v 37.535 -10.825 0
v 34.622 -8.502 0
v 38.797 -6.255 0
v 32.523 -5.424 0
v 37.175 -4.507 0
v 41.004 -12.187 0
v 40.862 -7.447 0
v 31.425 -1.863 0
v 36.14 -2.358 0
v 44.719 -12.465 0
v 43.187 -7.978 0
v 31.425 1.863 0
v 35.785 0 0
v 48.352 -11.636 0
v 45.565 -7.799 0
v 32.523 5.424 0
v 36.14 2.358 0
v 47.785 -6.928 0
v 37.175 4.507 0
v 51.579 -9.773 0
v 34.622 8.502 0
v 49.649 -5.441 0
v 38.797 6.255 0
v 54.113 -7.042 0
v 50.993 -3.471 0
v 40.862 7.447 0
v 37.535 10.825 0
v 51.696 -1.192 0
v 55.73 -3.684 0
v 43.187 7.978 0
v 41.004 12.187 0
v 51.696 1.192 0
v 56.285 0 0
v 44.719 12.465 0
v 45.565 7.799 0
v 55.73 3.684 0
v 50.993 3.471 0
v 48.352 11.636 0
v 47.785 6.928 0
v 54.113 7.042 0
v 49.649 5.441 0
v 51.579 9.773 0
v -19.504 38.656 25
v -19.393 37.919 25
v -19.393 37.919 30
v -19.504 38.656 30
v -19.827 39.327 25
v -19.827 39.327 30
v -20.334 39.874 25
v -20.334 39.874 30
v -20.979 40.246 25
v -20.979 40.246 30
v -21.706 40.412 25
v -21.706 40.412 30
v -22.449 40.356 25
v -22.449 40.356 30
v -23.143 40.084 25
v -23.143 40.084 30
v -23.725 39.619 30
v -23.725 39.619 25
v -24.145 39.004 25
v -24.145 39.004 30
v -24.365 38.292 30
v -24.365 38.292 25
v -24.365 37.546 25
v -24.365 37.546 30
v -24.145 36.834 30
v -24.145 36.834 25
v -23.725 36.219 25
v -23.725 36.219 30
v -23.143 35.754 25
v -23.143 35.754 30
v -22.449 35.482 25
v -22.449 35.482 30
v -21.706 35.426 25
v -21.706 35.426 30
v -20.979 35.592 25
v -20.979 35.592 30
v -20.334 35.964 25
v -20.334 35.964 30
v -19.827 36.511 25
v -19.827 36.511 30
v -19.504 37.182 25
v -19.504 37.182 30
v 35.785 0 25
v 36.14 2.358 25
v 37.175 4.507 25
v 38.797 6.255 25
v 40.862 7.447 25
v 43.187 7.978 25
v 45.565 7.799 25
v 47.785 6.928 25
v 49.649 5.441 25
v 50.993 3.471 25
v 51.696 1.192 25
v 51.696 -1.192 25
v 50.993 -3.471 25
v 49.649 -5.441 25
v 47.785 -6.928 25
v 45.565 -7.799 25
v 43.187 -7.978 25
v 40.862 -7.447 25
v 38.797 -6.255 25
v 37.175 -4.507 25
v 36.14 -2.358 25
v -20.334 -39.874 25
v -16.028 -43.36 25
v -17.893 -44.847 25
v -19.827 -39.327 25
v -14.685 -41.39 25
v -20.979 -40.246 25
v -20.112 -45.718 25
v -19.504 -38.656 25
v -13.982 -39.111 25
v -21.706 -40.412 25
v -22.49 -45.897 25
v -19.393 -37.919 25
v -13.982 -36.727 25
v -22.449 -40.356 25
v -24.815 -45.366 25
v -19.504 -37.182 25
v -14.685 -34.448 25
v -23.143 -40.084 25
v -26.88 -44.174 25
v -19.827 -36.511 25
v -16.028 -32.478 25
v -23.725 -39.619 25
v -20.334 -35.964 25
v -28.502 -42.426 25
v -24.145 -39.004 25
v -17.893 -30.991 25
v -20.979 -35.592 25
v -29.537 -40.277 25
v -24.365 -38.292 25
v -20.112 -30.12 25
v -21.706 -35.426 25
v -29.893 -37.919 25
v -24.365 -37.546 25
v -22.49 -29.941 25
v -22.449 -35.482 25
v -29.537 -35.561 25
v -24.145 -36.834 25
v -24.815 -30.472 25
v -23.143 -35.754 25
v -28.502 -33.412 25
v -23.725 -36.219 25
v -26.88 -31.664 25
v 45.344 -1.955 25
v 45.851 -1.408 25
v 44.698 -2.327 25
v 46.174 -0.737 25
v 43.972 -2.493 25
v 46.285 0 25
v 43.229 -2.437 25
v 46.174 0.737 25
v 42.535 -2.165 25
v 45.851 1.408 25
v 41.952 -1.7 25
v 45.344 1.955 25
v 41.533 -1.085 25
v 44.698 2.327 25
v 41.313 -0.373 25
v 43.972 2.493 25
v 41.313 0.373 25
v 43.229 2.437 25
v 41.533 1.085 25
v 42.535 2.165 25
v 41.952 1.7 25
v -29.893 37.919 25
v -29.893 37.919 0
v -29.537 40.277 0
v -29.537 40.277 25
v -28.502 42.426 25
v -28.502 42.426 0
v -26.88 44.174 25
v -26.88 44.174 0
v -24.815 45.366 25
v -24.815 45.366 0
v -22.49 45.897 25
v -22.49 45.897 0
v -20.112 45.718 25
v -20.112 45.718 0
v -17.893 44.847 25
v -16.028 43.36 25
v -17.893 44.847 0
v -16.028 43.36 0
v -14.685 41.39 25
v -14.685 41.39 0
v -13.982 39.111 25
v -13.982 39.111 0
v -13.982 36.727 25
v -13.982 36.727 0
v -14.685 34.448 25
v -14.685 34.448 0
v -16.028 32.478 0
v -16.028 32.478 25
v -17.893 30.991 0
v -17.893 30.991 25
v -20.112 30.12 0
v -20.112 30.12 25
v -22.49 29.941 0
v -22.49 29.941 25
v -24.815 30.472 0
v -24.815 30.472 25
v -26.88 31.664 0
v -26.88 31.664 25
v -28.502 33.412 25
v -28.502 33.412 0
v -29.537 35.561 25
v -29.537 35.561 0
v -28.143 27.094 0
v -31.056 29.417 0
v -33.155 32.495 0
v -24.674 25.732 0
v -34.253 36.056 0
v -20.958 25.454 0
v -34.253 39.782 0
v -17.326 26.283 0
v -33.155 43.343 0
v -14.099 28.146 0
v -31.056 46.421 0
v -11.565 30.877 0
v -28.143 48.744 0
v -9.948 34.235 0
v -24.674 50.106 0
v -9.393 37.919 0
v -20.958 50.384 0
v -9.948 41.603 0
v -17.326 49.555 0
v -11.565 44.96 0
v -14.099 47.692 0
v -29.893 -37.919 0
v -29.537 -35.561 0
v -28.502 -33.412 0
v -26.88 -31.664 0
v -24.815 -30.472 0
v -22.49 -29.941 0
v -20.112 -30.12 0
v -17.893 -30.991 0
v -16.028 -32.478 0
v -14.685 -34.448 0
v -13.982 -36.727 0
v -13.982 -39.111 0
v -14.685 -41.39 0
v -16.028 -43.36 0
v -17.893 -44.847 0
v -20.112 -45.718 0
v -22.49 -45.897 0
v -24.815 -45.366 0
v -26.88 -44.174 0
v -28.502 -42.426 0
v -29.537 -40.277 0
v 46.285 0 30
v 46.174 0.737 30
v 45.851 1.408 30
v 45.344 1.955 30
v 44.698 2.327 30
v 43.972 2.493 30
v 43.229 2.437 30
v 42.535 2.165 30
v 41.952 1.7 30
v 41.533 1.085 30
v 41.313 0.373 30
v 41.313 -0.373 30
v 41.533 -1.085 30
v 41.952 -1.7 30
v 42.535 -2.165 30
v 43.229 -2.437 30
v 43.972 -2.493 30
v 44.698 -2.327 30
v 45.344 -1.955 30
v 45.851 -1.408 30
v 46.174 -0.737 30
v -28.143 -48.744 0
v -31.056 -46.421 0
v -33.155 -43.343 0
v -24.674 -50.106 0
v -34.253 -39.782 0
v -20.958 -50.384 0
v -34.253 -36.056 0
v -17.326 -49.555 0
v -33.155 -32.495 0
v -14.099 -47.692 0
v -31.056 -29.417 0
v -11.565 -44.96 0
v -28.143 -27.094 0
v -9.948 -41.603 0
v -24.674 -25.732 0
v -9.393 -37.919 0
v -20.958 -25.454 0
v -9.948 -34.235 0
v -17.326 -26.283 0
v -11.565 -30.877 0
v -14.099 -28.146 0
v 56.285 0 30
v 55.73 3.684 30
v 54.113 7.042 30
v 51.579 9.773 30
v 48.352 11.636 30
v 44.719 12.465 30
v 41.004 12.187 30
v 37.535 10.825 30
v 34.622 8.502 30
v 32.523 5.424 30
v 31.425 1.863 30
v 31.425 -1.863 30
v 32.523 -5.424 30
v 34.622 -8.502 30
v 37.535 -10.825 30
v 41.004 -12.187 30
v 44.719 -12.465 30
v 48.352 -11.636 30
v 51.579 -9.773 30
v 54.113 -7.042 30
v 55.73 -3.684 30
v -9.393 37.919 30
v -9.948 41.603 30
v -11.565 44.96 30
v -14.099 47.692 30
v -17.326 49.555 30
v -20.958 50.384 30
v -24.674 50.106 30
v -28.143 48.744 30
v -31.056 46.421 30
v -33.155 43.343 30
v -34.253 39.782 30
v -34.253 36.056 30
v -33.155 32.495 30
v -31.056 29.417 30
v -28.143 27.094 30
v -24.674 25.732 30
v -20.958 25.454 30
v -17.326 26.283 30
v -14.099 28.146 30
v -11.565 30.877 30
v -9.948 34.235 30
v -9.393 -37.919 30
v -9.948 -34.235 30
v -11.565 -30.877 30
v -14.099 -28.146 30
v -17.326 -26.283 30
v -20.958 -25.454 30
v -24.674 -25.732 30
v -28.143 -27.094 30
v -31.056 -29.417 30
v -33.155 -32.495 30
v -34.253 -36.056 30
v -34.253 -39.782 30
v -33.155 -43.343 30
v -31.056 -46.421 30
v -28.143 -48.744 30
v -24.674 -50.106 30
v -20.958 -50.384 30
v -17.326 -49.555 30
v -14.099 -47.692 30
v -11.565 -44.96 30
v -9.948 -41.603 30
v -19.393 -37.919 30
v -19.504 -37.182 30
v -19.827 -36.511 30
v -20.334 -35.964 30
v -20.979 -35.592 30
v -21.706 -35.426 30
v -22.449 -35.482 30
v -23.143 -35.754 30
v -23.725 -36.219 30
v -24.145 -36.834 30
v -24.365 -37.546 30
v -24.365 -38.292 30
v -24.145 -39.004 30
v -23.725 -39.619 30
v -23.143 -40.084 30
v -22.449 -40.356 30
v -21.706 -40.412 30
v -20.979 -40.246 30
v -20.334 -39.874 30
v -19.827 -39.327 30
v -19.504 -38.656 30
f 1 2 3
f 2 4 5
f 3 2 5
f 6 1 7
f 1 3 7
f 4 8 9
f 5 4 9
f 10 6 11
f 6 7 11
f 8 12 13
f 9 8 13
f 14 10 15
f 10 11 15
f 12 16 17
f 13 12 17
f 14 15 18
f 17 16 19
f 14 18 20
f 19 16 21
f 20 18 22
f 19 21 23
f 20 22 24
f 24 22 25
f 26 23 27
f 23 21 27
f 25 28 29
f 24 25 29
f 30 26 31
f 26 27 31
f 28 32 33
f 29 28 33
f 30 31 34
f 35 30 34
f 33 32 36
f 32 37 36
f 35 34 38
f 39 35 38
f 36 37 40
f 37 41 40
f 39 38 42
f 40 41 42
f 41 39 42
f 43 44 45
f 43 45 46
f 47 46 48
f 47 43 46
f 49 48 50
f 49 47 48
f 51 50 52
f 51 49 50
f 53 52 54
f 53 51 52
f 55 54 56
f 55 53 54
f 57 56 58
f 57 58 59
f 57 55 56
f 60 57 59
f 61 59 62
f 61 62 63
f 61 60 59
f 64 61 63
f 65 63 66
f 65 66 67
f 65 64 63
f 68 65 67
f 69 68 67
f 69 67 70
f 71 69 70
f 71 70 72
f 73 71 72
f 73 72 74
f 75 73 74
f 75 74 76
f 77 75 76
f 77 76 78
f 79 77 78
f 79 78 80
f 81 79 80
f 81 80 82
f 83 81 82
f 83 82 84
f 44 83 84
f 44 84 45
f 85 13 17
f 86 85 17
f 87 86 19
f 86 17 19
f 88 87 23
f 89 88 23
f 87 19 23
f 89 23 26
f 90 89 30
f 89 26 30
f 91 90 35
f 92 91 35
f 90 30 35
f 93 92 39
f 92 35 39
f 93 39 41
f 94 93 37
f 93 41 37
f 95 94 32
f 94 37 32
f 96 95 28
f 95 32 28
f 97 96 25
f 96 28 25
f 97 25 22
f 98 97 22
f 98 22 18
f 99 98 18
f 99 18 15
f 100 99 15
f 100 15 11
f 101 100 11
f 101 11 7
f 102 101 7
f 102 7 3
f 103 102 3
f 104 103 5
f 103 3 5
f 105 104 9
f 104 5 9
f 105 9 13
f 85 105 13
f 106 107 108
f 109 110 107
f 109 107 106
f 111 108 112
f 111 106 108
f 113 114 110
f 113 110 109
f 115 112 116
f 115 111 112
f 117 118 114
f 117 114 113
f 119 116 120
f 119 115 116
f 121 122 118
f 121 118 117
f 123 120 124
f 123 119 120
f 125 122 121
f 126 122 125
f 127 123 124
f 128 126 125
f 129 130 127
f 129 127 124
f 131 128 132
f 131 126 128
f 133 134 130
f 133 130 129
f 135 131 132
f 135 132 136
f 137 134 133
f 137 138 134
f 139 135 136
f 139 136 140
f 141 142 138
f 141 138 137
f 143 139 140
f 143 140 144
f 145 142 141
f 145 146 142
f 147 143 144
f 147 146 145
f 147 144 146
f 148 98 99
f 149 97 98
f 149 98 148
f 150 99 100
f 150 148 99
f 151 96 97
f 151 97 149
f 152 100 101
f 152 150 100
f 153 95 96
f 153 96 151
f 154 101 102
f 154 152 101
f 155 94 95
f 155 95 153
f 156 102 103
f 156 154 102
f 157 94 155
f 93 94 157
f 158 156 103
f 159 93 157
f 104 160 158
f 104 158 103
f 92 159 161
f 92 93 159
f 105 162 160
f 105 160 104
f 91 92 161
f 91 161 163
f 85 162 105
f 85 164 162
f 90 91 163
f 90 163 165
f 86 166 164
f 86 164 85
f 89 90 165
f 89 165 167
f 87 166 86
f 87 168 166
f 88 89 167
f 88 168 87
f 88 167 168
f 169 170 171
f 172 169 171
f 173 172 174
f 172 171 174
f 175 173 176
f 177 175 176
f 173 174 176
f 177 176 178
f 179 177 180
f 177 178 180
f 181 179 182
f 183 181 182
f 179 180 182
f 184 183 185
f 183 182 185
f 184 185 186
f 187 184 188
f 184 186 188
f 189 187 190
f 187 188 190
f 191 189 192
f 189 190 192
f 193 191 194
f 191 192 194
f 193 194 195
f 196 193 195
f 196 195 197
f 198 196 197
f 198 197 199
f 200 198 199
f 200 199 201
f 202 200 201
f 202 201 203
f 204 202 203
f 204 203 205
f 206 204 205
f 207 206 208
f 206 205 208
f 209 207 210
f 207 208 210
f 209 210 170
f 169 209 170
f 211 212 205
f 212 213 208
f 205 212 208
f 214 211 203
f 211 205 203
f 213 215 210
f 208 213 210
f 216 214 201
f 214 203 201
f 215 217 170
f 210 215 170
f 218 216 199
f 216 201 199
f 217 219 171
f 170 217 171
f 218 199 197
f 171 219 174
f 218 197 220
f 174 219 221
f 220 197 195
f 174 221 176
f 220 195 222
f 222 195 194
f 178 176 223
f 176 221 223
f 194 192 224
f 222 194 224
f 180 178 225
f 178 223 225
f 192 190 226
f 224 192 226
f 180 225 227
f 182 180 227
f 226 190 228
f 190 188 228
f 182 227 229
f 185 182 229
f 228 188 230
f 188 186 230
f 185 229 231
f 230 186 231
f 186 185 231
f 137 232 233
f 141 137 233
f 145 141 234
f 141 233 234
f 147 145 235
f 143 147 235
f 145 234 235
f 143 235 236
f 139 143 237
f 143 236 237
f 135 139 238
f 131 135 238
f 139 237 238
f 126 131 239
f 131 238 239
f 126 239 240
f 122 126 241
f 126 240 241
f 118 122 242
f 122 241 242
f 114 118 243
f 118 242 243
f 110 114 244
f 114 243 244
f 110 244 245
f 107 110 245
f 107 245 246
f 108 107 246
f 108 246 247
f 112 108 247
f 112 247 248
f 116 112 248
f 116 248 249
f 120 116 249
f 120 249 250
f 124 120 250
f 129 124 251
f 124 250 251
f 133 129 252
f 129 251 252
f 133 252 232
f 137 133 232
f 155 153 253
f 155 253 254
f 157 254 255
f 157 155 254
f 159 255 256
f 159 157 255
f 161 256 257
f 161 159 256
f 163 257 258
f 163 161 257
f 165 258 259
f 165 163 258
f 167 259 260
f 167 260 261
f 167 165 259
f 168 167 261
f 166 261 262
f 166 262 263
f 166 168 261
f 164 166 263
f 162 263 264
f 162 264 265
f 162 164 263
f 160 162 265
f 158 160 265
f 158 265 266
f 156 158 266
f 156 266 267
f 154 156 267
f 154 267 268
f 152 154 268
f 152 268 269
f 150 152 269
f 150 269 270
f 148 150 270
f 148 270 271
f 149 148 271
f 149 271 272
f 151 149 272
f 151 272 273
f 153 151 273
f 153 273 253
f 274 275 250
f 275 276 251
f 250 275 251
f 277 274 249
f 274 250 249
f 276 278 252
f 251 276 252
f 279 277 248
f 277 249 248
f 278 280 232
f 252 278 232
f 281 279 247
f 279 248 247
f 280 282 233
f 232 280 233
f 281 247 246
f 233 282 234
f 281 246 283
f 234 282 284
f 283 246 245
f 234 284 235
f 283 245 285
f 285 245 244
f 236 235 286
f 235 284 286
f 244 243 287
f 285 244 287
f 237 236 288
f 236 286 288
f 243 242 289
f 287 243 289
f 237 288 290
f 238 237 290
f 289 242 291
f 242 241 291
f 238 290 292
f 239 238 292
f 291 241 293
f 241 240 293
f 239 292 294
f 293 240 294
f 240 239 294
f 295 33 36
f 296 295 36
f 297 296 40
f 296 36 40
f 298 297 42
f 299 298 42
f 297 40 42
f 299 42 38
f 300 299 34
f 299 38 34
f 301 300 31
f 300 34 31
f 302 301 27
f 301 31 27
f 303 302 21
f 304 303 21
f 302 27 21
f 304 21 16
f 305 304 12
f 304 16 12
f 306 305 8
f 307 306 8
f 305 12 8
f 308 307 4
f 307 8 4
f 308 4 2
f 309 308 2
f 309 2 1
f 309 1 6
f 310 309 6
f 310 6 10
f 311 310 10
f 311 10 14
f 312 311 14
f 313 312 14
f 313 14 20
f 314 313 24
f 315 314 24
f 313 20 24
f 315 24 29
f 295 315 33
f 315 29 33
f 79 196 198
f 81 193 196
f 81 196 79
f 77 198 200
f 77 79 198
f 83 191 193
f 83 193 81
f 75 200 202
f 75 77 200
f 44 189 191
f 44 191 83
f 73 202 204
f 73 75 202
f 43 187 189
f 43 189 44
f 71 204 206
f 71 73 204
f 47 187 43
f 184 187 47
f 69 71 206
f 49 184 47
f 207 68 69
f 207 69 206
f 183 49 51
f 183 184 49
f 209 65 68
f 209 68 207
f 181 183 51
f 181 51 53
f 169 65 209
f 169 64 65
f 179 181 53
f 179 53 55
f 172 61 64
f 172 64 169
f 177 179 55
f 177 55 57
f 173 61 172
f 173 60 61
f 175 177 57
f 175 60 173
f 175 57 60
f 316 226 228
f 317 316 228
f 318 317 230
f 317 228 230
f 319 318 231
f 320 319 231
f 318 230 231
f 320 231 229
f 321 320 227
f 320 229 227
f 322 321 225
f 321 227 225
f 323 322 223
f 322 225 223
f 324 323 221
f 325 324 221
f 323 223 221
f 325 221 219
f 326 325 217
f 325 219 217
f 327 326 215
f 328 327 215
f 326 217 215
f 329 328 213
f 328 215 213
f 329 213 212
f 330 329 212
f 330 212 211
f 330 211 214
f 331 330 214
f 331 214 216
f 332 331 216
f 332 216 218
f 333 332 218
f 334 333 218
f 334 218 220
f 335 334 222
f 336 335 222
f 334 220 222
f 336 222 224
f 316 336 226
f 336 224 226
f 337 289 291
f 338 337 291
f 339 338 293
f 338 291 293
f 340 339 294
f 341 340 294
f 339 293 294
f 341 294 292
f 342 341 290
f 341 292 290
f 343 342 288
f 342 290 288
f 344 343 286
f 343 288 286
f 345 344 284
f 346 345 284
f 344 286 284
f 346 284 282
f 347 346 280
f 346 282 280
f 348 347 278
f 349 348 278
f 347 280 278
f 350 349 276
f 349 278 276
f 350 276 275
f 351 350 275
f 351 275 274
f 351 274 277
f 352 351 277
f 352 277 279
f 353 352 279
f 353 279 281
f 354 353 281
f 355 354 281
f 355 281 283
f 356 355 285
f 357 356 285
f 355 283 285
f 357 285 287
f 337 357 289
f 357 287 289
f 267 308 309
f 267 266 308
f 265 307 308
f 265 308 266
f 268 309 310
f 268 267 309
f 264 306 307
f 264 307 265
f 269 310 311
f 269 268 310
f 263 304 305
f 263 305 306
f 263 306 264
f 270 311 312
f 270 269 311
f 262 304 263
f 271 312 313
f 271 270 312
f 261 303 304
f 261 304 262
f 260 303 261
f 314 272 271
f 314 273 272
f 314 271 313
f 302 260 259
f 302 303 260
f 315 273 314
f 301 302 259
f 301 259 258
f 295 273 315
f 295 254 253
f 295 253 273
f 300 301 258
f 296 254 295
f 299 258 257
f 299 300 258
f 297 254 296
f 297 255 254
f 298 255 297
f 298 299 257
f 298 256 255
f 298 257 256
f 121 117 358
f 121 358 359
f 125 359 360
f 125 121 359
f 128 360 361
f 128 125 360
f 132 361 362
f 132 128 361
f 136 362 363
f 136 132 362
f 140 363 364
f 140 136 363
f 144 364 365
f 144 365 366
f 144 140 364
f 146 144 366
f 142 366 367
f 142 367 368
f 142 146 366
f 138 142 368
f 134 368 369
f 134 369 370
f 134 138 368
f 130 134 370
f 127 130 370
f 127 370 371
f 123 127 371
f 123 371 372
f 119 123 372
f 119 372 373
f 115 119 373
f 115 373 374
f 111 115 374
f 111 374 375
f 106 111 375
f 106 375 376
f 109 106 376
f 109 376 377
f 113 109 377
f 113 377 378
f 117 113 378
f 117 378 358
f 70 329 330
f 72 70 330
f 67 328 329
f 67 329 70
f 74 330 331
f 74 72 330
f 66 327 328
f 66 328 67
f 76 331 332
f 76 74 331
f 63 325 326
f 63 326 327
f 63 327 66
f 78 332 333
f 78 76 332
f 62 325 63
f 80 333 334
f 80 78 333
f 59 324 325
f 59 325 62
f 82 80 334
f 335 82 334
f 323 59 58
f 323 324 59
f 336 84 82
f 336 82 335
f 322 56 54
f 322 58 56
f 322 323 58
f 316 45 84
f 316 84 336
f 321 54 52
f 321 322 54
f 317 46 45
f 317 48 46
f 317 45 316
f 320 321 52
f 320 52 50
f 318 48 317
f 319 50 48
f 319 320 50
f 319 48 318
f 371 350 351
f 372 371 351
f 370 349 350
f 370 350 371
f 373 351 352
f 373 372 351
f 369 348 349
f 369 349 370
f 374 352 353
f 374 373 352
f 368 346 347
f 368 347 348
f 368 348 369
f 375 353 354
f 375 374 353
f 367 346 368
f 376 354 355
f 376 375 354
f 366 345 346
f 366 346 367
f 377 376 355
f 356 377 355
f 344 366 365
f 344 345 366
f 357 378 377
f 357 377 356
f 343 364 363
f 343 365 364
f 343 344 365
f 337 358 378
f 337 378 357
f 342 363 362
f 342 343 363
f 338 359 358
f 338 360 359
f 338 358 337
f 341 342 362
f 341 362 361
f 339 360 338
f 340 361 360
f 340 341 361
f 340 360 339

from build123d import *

# Parameters (mm, degrees)
ESQUISSE1_R             = 12.5
ESQUISSE1_R_2           = 2.5
BOSS_EXTRU_1_DEPTH      = 30
BOSS_EXTRU_1_2_DEPTH    = 30
BOSS_EXTRU_1_3_DEPTH    = 30
ESQUISSE3_R             = 8
ENL_V_MAT_EXTRU_1_DEPTH = 25


with BuildPart() as part:
    # Esquisse1 → Boss.-Extru.1 (new body)
    with BuildSketch(Plane.XY):
        with Locations((43.785036873, 0)):
            Circle(ESQUISSE1_R)
        with Locations((43.785036873, 0)):
            Circle(ESQUISSE1_R_2, mode=Mode.SUBTRACT)
    extrude(amount=BOSS_EXTRU_1_DEPTH)


with BuildPart() as body_2:
    # Esquisse1 → Boss.-Extru.1 2 (new body)
    with BuildSketch(Plane.XY):
        with Locations((-21.892518437, -37.918954238)):
            Circle(ESQUISSE1_R)
        with Locations((-21.892518437, -37.918954238)):
            Circle(ESQUISSE1_R_2, mode=Mode.SUBTRACT)
    extrude(amount=BOSS_EXTRU_1_2_DEPTH)


with BuildPart() as body_3:
    # Esquisse1 → Boss.-Extru.1 3 (new body)
    with BuildSketch(Plane.XY):
        with Locations((-21.892518437, 37.918954238)):
            Circle(ESQUISSE1_R)
        with Locations((-21.892518437, 37.918954238)):
            Circle(ESQUISSE1_R_2, mode=Mode.SUBTRACT)
    extrude(amount=BOSS_EXTRU_1_3_DEPTH)


with BuildPart() as enl_v_mat_extru_1_tool:
    # Esquisse3 → Enlèv. mat.-Extru.1 (new body)
    with BuildSketch(Plane(origin=(0, 0, 0), x_dir=(-1, 0, 0), z_dir=(0, 0, -1))):
        with Locations((21.892518437, -37.918954238)):
            Circle(ESQUISSE3_R)
        with Locations((-43.785036873, 0)):
            Circle(ESQUISSE3_R)
        with Locations((21.892518437, 37.918954238)):
            Circle(ESQUISSE3_R)
    extrude(amount=-ENL_V_MAT_EXTRU_1_DEPTH)


with BuildPart() as part_1:
    add(part.part)

    # Enlèv. mat.-Extru.1: cut by enl_v_mat_extru_1_tool
    add(enl_v_mat_extru_1_tool.part, mode=Mode.SUBTRACT)


with BuildPart() as body_2_1:
    add(body_2.part)

    # Enlèv. mat.-Extru.1: cut by enl_v_mat_extru_1_tool
    add(enl_v_mat_extru_1_tool.part, mode=Mode.SUBTRACT)


with BuildPart() as body_3_1:
    add(body_3.part)

    # Enlèv. mat.-Extru.1: cut by enl_v_mat_extru_1_tool
    add(enl_v_mat_extru_1_tool.part, mode=Mode.SUBTRACT)


solid = Compound([part_1.part, body_2_1.part, body_3_1.part])
